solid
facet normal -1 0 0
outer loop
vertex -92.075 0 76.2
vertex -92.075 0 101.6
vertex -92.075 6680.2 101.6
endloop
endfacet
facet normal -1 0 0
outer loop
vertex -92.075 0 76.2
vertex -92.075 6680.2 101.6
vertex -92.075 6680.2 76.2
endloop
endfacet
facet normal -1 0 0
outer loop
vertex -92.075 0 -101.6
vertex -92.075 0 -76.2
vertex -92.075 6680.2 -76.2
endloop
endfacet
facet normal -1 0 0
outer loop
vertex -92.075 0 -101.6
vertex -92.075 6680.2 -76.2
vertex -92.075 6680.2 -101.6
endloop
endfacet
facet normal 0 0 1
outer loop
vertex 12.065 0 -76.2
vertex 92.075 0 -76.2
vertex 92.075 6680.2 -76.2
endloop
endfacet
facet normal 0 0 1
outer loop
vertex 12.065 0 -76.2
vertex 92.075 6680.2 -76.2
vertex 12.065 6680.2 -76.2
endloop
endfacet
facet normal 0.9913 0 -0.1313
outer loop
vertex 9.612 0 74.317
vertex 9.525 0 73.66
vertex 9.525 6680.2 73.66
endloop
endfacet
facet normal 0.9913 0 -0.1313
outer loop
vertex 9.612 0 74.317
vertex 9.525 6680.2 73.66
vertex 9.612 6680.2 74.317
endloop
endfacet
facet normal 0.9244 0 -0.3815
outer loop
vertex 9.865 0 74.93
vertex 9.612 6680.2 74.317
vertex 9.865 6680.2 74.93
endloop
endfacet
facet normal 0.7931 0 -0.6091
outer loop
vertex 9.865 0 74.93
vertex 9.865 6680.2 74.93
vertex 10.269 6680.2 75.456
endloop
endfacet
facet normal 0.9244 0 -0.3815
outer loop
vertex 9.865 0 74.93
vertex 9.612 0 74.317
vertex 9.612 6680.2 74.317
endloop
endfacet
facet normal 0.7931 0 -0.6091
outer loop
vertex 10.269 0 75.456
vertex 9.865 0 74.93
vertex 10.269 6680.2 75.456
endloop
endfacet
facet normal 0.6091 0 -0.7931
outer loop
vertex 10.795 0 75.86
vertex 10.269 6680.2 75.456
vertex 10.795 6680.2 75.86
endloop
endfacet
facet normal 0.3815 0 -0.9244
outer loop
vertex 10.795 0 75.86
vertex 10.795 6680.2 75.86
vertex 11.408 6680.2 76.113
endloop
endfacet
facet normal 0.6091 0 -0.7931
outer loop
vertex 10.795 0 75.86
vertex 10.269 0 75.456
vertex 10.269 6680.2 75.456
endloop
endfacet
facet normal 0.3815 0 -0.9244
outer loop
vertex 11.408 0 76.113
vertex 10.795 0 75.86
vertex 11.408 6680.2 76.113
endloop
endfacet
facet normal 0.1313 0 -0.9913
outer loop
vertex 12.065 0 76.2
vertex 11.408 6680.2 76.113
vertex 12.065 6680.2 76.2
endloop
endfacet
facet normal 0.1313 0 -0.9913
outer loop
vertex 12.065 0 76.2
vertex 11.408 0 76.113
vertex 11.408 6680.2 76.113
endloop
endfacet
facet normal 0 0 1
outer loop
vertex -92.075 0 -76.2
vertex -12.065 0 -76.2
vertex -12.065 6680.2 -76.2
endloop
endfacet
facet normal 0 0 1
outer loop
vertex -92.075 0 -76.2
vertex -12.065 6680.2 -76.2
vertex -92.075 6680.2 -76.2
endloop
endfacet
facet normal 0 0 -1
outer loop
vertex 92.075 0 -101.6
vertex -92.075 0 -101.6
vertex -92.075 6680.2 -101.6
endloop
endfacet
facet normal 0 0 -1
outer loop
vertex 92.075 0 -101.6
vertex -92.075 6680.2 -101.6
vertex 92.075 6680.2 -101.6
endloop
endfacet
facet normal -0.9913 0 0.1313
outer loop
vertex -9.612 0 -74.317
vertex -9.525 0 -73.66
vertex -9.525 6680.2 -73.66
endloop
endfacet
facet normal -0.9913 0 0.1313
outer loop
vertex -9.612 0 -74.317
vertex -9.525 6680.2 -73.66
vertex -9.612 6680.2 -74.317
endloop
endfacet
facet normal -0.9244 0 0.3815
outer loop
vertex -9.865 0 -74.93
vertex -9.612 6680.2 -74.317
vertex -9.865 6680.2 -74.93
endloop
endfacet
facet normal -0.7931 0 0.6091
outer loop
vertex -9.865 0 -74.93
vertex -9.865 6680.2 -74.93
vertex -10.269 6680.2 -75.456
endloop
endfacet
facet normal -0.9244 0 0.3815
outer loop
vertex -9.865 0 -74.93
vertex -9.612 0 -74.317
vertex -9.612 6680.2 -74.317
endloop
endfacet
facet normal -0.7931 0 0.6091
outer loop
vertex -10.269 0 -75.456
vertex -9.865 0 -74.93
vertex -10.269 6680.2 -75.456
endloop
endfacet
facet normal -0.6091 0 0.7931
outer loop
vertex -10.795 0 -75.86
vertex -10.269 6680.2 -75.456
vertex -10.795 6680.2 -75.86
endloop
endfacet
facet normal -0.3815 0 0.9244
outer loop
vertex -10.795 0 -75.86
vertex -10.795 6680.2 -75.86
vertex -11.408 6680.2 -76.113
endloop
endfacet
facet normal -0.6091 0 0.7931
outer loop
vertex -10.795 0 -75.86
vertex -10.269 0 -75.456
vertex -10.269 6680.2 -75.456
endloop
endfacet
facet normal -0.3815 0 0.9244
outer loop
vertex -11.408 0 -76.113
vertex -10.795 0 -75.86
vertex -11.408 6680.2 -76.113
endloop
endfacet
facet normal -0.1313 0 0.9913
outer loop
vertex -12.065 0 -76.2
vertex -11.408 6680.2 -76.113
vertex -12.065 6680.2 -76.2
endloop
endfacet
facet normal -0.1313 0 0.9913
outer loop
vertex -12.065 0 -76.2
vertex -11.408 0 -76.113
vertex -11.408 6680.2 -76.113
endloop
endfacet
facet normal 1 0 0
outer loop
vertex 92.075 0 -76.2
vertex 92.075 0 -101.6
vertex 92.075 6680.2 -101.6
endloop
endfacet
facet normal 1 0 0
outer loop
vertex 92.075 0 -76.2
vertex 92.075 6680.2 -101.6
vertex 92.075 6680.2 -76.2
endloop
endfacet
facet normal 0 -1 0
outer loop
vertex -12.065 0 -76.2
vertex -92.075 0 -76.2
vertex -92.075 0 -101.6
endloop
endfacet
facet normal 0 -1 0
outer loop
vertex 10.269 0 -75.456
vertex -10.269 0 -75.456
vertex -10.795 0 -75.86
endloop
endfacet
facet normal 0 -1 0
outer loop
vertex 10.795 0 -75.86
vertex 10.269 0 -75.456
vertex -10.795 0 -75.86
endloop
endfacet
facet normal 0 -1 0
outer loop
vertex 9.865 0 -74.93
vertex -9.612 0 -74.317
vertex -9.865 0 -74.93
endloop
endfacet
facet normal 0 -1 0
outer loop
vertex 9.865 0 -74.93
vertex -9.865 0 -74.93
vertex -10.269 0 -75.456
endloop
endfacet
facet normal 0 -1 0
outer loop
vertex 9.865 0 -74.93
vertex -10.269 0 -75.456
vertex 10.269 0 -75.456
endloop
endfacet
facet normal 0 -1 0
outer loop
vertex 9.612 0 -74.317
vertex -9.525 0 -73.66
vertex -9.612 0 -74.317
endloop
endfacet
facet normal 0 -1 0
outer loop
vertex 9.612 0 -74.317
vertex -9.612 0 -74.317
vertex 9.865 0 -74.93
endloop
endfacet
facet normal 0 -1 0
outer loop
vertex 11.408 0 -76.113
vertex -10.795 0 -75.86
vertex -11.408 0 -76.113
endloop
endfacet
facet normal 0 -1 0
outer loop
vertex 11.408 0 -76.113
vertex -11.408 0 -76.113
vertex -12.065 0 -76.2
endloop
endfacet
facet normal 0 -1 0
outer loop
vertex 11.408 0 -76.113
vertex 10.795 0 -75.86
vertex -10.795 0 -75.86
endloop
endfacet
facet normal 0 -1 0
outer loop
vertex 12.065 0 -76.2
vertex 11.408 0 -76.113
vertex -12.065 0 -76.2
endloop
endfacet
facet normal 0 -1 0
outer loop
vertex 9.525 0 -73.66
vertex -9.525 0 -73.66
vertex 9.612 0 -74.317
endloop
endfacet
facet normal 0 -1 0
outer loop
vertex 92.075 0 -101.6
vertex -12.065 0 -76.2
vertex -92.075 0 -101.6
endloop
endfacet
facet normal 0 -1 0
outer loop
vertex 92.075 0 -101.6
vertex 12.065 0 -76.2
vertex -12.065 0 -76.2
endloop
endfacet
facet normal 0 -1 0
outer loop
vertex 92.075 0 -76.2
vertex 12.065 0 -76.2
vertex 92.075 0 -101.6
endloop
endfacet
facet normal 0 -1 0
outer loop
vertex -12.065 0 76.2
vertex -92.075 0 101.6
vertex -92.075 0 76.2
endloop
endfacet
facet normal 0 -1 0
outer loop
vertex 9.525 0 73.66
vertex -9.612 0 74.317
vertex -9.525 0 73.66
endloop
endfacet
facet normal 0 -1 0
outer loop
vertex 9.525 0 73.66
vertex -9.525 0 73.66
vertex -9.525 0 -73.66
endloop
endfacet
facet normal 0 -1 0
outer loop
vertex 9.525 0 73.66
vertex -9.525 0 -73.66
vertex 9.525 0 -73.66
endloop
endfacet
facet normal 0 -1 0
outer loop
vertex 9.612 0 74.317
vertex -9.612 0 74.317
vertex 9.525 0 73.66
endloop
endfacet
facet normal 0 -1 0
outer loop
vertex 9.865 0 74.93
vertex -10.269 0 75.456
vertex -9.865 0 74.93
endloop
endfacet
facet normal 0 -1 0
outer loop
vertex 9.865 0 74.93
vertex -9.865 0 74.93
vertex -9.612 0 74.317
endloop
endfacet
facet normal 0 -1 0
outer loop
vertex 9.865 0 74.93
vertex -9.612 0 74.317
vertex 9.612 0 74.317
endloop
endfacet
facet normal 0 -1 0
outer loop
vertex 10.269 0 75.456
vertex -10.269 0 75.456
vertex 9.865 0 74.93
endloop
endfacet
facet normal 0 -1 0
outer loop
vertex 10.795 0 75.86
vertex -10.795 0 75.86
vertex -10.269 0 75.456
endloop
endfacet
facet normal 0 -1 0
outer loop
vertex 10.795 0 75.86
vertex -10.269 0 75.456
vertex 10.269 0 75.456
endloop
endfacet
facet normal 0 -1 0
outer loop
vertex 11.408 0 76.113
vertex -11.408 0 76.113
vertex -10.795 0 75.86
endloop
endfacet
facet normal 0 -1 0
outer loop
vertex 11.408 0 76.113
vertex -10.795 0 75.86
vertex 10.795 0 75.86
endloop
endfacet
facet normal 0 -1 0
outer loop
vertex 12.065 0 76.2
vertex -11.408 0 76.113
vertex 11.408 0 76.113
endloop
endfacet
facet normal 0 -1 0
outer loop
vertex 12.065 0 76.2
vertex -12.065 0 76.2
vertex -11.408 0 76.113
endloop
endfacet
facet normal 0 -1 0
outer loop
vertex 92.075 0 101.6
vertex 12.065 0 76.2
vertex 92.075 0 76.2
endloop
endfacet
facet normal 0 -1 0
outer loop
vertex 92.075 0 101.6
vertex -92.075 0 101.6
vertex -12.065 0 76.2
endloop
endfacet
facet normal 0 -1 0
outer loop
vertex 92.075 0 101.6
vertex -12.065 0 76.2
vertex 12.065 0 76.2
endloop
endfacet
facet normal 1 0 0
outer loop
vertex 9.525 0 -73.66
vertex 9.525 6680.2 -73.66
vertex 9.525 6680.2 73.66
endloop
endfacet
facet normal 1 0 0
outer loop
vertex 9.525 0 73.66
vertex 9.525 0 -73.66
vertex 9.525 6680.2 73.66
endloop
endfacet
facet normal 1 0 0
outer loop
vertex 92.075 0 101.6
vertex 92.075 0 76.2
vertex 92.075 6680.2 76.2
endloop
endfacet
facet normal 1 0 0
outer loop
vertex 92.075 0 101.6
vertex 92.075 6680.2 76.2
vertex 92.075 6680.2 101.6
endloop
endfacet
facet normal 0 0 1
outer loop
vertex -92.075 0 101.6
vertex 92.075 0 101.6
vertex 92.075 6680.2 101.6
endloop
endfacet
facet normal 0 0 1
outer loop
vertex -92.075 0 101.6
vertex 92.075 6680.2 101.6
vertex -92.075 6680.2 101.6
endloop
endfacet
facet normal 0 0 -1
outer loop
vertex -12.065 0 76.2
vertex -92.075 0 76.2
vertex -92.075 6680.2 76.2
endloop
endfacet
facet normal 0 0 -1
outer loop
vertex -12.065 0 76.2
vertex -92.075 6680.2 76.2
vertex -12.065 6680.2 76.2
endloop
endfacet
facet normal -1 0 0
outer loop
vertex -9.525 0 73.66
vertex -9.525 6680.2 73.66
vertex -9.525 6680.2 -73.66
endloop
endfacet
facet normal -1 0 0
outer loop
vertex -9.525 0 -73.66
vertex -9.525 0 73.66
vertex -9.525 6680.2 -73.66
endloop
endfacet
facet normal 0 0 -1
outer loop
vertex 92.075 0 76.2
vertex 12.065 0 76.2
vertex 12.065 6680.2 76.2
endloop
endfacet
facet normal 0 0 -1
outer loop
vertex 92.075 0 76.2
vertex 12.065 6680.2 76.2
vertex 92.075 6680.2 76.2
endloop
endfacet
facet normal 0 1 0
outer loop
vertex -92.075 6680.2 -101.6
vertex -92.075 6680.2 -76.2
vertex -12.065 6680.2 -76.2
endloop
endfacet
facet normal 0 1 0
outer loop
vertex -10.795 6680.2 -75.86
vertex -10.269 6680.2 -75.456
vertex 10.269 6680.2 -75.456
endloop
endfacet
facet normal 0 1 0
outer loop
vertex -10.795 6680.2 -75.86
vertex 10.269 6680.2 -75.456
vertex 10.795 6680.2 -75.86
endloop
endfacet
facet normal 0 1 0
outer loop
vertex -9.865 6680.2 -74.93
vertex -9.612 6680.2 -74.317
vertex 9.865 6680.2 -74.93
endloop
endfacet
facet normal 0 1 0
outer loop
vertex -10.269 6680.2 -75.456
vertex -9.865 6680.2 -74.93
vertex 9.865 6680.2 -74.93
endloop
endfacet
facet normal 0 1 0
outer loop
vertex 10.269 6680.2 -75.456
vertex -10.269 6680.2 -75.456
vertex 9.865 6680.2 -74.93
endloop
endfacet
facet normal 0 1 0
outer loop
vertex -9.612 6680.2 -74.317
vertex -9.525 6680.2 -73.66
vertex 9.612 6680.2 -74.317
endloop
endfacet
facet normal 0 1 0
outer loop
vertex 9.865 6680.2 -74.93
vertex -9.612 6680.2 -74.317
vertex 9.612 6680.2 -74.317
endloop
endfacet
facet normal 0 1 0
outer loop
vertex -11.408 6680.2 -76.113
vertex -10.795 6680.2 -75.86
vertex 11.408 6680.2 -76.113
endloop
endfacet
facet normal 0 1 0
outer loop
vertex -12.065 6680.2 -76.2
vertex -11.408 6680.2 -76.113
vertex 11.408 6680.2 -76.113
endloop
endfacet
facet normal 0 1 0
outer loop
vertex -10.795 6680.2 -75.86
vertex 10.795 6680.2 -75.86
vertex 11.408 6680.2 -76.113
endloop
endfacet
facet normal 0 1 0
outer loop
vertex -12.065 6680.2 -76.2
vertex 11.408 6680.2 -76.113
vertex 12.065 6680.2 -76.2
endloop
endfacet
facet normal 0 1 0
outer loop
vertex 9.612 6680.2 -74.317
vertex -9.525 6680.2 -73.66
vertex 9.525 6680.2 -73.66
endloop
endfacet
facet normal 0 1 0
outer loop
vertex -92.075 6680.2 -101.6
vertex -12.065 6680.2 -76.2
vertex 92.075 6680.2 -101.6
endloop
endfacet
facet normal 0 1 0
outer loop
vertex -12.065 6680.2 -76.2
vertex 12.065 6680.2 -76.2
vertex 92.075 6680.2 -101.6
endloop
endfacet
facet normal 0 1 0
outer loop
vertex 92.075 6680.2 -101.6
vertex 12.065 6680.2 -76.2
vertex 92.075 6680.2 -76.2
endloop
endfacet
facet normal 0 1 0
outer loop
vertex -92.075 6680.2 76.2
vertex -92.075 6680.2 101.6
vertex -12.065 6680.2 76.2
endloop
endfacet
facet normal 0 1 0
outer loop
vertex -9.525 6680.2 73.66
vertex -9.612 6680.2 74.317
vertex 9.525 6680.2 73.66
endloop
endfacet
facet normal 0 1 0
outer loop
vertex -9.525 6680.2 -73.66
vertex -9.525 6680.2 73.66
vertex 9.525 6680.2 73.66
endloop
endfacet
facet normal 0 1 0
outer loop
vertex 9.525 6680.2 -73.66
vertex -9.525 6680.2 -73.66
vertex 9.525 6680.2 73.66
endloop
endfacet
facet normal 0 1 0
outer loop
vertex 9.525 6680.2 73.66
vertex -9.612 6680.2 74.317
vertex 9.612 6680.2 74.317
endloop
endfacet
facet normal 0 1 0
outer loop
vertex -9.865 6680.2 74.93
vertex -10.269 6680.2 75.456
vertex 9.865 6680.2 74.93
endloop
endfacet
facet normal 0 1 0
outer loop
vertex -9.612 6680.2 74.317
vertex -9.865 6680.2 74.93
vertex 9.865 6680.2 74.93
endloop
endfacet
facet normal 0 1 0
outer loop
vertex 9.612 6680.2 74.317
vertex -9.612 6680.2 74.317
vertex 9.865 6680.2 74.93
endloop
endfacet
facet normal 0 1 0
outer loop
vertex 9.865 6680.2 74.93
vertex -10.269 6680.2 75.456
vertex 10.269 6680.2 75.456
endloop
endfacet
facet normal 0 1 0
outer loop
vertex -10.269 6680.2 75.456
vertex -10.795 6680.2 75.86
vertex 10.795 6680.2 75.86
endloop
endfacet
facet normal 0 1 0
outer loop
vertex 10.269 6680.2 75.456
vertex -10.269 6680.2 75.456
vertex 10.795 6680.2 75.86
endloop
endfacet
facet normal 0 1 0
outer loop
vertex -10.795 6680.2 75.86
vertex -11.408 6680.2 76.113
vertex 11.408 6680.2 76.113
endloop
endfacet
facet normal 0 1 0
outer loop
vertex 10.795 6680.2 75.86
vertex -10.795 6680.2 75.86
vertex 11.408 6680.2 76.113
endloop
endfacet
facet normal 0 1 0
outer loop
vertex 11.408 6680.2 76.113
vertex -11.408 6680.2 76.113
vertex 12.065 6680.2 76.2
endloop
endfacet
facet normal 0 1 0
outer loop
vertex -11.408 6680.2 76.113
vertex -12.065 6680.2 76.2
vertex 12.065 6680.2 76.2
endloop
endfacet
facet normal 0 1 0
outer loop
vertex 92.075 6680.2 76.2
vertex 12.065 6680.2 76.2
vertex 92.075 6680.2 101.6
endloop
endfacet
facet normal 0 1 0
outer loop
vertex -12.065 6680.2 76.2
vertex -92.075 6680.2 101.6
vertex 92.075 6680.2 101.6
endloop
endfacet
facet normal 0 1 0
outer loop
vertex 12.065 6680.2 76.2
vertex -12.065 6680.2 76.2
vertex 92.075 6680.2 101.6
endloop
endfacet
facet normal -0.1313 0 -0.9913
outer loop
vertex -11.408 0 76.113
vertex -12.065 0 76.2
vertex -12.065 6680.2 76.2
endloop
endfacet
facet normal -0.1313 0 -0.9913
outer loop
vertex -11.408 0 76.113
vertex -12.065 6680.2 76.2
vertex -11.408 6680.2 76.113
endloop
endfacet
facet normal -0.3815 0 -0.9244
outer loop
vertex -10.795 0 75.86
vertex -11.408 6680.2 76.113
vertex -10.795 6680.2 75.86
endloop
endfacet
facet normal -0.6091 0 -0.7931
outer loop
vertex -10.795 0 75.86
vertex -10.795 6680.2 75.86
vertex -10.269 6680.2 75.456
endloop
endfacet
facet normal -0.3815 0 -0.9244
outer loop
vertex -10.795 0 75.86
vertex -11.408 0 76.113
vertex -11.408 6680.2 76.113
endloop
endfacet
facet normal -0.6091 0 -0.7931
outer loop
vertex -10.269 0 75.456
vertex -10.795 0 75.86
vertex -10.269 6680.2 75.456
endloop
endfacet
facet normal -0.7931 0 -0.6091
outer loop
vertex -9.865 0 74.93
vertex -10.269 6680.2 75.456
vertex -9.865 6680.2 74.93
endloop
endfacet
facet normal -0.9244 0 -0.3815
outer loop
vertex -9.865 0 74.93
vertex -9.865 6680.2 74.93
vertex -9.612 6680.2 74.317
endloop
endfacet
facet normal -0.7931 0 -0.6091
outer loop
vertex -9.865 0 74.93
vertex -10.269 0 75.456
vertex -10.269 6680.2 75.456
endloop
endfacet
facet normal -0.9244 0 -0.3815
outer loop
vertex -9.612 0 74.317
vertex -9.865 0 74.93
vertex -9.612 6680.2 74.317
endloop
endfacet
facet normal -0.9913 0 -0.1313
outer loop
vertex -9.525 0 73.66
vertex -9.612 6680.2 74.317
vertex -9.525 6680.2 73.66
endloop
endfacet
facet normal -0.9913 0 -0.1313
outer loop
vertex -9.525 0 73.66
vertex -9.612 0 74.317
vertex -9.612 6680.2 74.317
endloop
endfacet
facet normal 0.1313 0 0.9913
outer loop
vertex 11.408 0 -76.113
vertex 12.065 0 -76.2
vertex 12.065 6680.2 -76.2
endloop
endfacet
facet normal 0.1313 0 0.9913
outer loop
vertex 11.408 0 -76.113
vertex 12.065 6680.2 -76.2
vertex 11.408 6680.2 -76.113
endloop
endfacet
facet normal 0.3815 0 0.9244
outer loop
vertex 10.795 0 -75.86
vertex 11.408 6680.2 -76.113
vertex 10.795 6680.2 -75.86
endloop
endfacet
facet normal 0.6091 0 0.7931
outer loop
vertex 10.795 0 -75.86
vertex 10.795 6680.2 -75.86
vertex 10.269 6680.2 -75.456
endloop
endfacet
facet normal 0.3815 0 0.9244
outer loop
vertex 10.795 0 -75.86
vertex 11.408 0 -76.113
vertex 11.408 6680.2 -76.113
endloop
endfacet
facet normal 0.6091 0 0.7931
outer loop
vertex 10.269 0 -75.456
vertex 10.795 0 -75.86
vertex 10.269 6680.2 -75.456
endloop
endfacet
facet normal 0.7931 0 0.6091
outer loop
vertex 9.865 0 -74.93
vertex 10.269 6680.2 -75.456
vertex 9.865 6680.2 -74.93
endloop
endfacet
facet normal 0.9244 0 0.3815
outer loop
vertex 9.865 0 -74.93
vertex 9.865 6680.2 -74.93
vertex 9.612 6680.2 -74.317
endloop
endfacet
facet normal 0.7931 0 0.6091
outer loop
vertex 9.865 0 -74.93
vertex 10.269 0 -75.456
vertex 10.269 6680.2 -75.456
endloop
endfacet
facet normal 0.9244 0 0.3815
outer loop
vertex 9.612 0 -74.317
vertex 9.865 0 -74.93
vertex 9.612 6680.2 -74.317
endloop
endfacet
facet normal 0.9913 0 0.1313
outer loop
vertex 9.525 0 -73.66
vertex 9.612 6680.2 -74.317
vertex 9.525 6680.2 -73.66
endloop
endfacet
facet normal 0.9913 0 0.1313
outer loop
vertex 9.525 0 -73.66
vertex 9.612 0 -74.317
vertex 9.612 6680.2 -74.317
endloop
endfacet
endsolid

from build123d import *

# Parameters (mm, degrees)
F1_DEPTH = 6680.2


with BuildPart() as f1:
    # F0 (on Front) → F1 (new body)
    with BuildSketch(Plane.XZ):
        with BuildLine():
            Line((92.075, -101.6), (92.075, -76.2))
            Line((92.075, -76.2), (12.065, -76.2))
            ThreePointArc((12.065, -76.2), (10.268949, -75.456051), (9.525, -73.66))
            Line((9.525, -73.66), (9.525, 73.66))
            ThreePointArc((9.525, 73.66), (10.268949, 75.456051), (12.065, 76.2))
            Line((12.065, 76.2), (92.075, 76.2))
            Line((92.075, 76.2), (92.075, 101.6))
            Line((92.075, 101.6), (-92.075, 101.6))
            Line((-92.075, 101.6), (-92.075, 76.2))
            Line((-92.075, 76.2), (-12.065, 76.2))
            ThreePointArc((-12.065, 76.2), (-10.268949, 75.456051), (-9.525, 73.66))
            Line((-9.525, 73.66), (-9.525, -73.66))
            ThreePointArc((-9.525, -73.66), (-10.268949, -75.456051), (-12.065, -76.2))
            Line((-12.065, -76.2), (-92.075, -76.2))
            Line((-92.075, -76.2), (-92.075, -101.6))
            Line((-92.075, -101.6), (92.075, -101.6))
        make_face()
    extrude(amount=-F1_DEPTH)


solid = f1.part
